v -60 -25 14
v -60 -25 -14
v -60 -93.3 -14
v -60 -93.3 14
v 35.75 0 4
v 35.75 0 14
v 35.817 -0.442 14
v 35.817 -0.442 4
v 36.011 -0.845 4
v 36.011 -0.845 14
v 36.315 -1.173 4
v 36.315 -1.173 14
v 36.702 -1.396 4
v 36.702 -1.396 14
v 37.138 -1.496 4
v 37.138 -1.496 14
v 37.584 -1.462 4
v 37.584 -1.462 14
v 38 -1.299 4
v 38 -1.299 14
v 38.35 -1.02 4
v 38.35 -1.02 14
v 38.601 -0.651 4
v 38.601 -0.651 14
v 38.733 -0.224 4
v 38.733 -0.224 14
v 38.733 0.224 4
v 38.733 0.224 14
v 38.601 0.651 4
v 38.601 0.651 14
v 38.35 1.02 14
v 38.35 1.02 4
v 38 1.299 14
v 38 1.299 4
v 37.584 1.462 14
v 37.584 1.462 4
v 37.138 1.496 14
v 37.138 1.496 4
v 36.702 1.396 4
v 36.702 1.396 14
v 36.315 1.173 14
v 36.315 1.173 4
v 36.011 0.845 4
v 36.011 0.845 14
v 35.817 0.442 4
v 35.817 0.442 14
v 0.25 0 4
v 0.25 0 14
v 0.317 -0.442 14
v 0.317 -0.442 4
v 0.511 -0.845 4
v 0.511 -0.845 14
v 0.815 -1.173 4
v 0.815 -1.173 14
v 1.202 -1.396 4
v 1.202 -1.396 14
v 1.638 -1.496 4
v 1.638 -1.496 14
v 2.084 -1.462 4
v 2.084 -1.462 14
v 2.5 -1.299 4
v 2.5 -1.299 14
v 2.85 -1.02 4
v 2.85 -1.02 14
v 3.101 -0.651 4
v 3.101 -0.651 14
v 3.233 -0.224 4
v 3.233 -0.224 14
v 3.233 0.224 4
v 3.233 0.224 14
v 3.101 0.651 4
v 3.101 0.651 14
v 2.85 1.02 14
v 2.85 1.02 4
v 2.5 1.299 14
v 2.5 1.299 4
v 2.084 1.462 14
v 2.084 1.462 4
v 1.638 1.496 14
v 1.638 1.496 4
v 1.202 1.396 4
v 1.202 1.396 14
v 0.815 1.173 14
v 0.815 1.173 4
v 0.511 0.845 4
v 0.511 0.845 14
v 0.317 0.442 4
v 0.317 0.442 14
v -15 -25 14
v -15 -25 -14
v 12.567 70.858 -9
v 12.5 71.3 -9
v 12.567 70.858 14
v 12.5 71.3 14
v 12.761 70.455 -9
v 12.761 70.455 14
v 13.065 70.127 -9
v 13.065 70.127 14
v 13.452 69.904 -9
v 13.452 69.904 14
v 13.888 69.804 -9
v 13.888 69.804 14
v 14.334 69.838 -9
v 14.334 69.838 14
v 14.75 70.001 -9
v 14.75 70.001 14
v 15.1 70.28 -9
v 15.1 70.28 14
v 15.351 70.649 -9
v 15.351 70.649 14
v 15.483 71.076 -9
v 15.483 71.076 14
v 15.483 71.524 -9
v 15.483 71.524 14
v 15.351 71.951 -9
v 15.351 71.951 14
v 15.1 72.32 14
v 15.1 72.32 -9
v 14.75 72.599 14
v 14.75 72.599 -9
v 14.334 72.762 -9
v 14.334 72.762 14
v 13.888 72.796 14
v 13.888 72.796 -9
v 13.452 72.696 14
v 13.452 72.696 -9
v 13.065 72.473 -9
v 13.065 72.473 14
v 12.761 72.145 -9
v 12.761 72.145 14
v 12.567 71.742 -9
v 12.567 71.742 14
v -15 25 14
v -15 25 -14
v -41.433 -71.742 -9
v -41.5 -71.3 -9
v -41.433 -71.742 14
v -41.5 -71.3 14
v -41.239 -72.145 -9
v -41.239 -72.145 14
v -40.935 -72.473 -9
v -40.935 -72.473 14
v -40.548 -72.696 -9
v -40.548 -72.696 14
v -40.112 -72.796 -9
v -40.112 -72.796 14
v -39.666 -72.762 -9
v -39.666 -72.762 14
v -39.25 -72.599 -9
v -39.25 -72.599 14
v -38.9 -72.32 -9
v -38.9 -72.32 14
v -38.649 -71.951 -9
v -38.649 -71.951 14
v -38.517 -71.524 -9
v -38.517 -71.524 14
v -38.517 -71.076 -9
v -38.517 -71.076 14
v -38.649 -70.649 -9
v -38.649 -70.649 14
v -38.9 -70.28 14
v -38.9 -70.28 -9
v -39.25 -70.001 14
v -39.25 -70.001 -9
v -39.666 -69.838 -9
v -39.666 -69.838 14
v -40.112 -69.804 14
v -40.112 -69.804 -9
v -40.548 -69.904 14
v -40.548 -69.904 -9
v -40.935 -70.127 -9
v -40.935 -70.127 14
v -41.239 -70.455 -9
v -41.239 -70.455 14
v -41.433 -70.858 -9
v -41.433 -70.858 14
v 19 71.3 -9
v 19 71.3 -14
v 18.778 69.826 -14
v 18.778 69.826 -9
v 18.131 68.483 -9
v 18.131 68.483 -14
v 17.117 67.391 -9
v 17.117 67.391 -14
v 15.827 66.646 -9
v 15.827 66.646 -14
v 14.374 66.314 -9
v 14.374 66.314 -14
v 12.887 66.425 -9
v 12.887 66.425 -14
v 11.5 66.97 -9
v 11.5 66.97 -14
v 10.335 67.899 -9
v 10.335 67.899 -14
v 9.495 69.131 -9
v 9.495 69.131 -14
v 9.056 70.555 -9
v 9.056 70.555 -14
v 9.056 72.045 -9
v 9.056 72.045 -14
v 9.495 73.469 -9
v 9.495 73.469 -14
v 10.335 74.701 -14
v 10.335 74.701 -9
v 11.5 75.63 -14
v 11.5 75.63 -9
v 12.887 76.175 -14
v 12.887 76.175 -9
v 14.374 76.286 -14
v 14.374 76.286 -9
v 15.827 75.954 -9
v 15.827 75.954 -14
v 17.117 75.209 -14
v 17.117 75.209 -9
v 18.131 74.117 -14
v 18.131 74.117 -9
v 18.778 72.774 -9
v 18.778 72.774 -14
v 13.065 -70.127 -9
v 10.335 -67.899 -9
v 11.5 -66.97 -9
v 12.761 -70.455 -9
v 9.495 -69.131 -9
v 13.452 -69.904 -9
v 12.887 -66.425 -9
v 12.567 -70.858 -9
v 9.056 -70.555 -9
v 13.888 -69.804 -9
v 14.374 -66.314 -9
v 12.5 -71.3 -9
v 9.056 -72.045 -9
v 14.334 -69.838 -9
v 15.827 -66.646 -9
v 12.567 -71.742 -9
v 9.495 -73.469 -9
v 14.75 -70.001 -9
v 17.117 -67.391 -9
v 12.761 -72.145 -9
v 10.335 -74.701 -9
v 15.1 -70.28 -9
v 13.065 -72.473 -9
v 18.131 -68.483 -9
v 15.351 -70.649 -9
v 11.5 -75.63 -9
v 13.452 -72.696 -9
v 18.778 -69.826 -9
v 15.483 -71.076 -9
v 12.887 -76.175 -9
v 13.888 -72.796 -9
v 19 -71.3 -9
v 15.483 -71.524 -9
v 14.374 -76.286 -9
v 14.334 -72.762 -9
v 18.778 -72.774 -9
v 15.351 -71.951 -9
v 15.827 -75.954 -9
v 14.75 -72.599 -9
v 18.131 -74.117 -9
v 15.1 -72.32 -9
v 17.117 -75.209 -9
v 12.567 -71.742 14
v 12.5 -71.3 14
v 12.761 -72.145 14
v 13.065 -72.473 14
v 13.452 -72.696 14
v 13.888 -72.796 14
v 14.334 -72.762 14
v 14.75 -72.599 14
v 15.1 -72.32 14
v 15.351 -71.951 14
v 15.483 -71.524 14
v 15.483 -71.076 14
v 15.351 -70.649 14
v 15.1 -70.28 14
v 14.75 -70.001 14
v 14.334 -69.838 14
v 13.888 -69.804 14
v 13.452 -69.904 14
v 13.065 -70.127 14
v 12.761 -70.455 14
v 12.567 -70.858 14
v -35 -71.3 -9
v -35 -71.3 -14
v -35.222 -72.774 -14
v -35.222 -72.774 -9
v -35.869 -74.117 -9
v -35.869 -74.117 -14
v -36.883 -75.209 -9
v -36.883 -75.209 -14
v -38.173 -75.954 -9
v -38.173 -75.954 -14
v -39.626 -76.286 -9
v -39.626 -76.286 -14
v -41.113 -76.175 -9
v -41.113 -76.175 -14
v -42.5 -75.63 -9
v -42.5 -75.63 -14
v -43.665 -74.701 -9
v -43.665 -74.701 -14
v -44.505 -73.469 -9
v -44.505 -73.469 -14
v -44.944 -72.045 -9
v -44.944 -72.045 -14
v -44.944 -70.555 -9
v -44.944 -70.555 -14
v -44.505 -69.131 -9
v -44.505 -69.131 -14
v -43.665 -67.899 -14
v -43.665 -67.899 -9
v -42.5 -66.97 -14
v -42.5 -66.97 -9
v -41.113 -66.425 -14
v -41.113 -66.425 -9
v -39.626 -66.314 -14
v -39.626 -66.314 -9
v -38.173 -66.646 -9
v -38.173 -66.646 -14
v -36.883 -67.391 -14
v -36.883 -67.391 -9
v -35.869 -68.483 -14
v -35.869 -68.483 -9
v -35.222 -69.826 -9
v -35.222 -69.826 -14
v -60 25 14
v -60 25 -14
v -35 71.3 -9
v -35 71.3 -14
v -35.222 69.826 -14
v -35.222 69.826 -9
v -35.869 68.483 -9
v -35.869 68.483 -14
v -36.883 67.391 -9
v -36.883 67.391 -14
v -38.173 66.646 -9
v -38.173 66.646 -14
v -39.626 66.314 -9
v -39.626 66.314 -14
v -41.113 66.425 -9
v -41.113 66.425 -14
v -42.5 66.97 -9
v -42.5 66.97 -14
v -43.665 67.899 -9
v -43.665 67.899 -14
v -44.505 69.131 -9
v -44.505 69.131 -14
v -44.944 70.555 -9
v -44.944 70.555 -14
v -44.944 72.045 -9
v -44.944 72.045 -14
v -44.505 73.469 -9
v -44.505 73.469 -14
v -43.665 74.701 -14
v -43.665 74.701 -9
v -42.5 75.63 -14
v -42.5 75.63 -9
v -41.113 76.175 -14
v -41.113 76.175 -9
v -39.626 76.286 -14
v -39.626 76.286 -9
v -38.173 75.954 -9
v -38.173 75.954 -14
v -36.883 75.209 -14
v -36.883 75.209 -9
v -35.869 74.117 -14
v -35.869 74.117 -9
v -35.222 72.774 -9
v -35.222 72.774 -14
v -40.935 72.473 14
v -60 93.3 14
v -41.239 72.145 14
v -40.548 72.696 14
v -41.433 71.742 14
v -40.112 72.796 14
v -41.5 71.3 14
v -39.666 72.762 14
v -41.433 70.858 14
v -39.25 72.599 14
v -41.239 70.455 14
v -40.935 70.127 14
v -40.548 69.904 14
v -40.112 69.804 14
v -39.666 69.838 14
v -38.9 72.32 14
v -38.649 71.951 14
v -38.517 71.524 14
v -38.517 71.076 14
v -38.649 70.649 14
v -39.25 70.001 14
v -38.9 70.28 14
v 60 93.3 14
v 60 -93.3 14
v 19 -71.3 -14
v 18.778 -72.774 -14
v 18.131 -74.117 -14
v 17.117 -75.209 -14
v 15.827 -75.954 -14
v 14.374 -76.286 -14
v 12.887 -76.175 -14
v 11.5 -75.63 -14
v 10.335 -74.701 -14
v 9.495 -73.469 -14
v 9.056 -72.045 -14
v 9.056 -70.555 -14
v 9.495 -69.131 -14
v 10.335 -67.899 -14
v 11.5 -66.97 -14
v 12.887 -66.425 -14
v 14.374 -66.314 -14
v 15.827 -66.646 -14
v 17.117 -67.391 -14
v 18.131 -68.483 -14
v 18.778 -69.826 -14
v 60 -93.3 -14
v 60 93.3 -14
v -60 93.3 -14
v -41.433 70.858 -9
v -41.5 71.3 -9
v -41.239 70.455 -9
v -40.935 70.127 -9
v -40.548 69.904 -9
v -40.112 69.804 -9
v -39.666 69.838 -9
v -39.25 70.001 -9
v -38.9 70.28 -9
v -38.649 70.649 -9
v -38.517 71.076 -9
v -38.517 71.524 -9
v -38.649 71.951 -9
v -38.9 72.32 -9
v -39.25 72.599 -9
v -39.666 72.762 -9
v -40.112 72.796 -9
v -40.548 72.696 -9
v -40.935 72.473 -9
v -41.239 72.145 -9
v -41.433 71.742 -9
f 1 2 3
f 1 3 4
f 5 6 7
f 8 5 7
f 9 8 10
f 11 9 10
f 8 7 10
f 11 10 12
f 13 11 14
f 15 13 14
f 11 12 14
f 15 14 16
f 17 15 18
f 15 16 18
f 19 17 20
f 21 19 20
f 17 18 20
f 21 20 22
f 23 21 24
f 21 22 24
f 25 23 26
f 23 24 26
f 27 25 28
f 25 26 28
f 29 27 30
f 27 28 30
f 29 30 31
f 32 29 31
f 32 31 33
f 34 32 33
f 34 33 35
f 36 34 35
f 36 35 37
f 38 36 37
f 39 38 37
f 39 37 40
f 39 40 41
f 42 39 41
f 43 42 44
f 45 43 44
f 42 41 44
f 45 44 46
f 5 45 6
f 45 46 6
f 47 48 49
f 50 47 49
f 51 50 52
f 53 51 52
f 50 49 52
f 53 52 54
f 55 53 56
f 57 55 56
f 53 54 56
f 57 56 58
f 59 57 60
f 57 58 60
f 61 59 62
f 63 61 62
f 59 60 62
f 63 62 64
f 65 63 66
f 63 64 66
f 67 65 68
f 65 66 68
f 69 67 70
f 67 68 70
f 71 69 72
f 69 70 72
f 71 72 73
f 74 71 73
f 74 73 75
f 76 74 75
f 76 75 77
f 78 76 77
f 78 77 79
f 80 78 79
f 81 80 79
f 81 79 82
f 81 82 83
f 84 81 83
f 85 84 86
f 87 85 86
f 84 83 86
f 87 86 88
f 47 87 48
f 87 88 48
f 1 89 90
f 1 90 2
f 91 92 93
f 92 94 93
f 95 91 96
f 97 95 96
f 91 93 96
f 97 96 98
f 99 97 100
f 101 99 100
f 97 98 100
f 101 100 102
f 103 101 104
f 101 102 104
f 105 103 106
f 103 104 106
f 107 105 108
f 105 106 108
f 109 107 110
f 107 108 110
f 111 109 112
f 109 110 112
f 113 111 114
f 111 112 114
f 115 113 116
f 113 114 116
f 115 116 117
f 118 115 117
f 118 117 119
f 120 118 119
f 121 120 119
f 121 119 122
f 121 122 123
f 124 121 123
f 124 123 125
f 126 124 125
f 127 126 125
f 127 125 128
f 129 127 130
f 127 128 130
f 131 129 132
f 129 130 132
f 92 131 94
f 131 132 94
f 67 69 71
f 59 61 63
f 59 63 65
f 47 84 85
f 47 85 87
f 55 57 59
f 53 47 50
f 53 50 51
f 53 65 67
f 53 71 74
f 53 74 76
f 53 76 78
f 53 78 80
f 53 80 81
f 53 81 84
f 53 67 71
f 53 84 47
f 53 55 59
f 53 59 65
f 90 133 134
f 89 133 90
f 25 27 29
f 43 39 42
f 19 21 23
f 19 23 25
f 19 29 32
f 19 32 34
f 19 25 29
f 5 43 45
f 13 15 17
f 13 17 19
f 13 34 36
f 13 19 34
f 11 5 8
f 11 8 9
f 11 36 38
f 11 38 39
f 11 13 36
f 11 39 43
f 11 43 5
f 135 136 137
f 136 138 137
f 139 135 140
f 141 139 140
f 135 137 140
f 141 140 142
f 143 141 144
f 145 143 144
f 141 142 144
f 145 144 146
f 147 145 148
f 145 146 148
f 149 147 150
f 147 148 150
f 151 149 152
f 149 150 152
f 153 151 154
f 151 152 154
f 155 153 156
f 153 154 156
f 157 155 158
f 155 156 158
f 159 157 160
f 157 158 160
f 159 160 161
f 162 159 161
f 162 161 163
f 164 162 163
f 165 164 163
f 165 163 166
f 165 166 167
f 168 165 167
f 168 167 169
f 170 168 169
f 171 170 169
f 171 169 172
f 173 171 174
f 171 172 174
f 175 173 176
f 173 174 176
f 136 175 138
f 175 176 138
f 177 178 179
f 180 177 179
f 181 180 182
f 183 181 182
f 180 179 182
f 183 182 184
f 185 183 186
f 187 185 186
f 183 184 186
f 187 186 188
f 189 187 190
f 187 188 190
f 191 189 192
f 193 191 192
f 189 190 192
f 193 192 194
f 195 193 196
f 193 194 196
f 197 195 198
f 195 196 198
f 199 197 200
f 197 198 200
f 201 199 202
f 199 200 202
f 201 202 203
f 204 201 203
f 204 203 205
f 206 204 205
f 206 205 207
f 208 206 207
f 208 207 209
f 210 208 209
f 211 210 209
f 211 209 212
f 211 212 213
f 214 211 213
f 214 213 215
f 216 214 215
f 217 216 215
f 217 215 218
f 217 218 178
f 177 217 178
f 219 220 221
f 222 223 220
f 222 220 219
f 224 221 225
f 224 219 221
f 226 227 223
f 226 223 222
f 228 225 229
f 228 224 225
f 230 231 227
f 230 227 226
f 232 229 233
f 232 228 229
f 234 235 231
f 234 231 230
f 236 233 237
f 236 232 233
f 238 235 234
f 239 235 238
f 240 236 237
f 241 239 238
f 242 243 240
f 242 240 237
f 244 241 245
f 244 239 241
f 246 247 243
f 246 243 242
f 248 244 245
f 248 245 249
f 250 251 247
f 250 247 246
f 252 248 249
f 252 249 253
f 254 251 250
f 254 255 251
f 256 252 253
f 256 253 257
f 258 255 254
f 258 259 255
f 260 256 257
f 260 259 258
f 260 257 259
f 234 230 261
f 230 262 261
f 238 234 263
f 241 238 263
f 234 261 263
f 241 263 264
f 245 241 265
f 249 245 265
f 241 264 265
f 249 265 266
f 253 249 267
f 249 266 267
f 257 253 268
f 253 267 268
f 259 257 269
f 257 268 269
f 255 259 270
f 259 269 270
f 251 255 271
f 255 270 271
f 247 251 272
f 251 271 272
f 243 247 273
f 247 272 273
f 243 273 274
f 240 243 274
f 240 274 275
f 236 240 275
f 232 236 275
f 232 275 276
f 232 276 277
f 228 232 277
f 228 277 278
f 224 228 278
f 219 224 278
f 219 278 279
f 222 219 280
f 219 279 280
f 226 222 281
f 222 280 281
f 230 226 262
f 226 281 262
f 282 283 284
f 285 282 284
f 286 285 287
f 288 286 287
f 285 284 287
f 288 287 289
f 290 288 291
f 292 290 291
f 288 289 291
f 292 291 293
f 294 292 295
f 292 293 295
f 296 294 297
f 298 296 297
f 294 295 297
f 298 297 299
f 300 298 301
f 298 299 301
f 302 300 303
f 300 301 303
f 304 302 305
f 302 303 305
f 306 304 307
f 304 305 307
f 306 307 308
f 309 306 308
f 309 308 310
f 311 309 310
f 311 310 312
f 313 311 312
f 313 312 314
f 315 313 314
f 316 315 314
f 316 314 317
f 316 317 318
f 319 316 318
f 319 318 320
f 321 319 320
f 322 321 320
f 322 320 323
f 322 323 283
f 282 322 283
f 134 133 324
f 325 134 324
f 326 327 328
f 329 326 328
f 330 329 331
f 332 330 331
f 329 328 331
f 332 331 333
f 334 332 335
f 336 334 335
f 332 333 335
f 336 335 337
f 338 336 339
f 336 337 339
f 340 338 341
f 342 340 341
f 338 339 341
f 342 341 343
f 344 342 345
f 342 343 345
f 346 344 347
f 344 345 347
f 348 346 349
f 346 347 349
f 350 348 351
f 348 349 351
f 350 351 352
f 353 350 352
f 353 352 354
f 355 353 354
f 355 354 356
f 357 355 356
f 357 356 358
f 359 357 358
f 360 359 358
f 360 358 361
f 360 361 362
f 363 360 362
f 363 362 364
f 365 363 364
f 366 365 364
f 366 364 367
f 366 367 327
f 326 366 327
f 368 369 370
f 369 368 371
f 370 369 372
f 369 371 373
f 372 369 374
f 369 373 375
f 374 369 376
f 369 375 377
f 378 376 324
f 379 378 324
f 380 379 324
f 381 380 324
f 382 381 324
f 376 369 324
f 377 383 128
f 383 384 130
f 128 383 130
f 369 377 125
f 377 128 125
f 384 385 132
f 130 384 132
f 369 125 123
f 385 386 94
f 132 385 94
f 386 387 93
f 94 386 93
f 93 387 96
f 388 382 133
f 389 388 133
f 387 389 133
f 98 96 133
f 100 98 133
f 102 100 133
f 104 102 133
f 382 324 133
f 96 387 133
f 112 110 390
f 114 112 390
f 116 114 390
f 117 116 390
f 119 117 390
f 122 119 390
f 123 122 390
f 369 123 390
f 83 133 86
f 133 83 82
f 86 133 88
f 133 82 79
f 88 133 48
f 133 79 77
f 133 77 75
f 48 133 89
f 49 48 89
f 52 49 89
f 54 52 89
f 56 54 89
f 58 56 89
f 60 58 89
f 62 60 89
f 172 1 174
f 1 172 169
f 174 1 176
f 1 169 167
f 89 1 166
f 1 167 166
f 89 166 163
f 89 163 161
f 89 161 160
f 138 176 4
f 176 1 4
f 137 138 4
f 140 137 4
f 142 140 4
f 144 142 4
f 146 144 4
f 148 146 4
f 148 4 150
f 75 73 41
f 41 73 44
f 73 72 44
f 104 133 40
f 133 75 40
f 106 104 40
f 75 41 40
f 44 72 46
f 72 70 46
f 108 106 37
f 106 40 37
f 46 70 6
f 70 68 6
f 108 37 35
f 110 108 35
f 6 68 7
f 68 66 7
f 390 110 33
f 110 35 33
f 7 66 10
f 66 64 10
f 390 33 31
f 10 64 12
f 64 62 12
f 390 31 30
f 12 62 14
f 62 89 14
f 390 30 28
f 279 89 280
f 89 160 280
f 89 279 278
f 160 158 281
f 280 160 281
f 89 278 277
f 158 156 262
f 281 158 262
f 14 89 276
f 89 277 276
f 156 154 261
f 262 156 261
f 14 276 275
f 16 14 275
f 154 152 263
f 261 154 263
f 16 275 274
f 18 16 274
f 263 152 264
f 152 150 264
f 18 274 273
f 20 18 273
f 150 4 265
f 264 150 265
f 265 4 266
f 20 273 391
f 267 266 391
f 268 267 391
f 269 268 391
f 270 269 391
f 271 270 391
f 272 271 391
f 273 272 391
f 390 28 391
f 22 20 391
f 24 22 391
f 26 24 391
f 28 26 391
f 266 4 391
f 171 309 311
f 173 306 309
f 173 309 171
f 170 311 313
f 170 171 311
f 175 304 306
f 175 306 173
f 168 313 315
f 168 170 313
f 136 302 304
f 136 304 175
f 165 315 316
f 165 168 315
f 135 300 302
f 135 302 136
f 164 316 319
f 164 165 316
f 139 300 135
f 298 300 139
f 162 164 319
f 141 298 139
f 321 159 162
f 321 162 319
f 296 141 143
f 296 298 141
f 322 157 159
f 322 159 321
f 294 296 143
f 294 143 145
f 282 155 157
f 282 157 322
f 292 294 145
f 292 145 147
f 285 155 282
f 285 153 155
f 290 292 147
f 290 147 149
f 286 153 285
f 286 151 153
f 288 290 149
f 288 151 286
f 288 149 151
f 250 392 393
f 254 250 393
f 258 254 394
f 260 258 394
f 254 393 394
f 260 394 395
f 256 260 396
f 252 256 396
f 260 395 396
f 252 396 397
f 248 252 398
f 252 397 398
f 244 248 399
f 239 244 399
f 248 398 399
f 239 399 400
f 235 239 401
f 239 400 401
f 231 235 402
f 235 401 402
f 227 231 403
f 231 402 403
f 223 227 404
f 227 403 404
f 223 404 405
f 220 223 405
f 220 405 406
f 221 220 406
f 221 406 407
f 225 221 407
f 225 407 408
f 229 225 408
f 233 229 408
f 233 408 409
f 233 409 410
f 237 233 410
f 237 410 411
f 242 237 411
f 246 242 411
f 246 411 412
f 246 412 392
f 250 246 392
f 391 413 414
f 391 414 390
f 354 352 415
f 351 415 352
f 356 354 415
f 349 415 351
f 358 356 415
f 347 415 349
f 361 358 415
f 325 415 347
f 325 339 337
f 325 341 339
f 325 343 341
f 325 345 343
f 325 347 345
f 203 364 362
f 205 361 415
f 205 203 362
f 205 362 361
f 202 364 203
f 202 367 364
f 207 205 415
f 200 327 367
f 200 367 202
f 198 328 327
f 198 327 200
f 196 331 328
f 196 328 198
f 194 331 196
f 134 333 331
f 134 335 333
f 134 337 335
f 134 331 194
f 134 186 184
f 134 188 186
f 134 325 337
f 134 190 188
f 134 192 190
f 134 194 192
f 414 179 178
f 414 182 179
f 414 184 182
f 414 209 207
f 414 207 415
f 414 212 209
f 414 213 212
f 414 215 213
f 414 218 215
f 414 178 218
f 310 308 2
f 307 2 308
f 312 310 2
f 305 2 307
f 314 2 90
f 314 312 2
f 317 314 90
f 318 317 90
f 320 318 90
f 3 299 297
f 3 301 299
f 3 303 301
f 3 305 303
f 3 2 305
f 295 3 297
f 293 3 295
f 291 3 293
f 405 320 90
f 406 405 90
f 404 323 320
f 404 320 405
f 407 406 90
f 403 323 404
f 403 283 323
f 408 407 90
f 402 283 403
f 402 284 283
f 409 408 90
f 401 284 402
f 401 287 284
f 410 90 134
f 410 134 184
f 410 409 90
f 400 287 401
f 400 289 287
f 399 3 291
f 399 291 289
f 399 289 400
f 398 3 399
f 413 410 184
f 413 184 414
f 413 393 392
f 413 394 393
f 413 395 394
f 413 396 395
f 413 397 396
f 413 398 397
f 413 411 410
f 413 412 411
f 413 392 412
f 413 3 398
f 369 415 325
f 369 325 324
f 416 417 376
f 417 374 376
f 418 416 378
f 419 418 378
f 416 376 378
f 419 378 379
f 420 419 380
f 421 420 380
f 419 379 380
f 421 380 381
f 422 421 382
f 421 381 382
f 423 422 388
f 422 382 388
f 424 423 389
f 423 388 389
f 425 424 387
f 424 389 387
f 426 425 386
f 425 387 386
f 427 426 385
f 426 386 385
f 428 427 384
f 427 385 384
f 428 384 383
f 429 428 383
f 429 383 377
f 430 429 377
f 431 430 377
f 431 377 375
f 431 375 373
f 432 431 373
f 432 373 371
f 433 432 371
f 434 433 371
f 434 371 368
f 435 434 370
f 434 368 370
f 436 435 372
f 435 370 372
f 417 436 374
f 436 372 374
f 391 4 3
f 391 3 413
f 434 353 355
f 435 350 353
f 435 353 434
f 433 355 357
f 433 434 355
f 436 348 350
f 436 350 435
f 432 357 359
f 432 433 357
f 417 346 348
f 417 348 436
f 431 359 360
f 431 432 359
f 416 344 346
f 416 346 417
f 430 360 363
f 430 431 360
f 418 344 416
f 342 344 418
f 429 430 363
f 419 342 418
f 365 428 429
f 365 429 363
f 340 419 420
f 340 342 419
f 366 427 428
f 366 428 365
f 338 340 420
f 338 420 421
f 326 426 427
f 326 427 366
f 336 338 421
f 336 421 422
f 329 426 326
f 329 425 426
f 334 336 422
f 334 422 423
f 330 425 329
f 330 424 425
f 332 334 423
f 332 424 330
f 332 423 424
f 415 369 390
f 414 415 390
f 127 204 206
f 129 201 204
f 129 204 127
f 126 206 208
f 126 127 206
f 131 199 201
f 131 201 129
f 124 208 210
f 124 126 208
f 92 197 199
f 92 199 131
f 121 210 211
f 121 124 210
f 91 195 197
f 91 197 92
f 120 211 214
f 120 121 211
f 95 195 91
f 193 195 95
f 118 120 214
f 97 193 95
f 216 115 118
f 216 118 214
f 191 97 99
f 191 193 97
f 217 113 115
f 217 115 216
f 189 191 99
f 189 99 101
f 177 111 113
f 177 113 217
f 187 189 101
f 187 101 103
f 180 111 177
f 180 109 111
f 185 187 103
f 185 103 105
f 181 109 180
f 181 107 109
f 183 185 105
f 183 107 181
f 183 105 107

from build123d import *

# Parameters (mm, degrees)
SKETCH_W         = 120
SKETCH_H         = 28
PAD_DEPTH        = 93.3
SKETCH001_R      = 1.5
POCKET_DEPTH     = 10
HOLE_D           = 3
HOLE_CBORE_D     = 10
HOLE_CBORE_DEPTH = 5
SKETCH003_W      = 45
SKETCH003_H      = 50
POCKET001_DEPTH  = 28.001


with BuildPart() as part:
    # Sketch → Pad (new body, symmetric)
    with BuildSketch(Plane.XZ):
        Rectangle(SKETCH_W, SKETCH_H)
    extrude(amount=PAD_DEPTH, both=True)

    # Sketch001 (on Face1 of Pad) → Pocket (cut)
    with BuildSketch(Plane(origin=(0, 0, 14), x_dir=(-1, 0, 0), z_dir=(0, 0, 1))):
        with Locations((-37.25, 0)):
            Circle(SKETCH001_R)
        with Locations((-1.75, 0)):
            Circle(SKETCH001_R)
    extrude(amount=-POCKET_DEPTH, mode=Mode.SUBTRACT)

    # Hole (through all)
    with Locations(Plane(origin=(0, 0, -14), x_dir=(1, 0, 0), z_dir=(0, 0, -1))):
        with Locations((-40, 71.3), (14, 71.3), (14, -71.3), (-40, -71.3)):
            CounterBoreHole(HOLE_D / 2, HOLE_CBORE_D / 2, HOLE_CBORE_DEPTH)

    # Sketch003 (on Face1 of Hole) → Pocket001 (cut, through all)
    with BuildSketch(Plane(origin=(0, 0, 14), x_dir=(-1, 0, 0), z_dir=(0, 0, 1))):
        with Locations((37.5, 0)):
            Rectangle(SKETCH003_W, SKETCH003_H)
    extrude(amount=-POCKET001_DEPTH, mode=Mode.SUBTRACT)


solid = part.part
